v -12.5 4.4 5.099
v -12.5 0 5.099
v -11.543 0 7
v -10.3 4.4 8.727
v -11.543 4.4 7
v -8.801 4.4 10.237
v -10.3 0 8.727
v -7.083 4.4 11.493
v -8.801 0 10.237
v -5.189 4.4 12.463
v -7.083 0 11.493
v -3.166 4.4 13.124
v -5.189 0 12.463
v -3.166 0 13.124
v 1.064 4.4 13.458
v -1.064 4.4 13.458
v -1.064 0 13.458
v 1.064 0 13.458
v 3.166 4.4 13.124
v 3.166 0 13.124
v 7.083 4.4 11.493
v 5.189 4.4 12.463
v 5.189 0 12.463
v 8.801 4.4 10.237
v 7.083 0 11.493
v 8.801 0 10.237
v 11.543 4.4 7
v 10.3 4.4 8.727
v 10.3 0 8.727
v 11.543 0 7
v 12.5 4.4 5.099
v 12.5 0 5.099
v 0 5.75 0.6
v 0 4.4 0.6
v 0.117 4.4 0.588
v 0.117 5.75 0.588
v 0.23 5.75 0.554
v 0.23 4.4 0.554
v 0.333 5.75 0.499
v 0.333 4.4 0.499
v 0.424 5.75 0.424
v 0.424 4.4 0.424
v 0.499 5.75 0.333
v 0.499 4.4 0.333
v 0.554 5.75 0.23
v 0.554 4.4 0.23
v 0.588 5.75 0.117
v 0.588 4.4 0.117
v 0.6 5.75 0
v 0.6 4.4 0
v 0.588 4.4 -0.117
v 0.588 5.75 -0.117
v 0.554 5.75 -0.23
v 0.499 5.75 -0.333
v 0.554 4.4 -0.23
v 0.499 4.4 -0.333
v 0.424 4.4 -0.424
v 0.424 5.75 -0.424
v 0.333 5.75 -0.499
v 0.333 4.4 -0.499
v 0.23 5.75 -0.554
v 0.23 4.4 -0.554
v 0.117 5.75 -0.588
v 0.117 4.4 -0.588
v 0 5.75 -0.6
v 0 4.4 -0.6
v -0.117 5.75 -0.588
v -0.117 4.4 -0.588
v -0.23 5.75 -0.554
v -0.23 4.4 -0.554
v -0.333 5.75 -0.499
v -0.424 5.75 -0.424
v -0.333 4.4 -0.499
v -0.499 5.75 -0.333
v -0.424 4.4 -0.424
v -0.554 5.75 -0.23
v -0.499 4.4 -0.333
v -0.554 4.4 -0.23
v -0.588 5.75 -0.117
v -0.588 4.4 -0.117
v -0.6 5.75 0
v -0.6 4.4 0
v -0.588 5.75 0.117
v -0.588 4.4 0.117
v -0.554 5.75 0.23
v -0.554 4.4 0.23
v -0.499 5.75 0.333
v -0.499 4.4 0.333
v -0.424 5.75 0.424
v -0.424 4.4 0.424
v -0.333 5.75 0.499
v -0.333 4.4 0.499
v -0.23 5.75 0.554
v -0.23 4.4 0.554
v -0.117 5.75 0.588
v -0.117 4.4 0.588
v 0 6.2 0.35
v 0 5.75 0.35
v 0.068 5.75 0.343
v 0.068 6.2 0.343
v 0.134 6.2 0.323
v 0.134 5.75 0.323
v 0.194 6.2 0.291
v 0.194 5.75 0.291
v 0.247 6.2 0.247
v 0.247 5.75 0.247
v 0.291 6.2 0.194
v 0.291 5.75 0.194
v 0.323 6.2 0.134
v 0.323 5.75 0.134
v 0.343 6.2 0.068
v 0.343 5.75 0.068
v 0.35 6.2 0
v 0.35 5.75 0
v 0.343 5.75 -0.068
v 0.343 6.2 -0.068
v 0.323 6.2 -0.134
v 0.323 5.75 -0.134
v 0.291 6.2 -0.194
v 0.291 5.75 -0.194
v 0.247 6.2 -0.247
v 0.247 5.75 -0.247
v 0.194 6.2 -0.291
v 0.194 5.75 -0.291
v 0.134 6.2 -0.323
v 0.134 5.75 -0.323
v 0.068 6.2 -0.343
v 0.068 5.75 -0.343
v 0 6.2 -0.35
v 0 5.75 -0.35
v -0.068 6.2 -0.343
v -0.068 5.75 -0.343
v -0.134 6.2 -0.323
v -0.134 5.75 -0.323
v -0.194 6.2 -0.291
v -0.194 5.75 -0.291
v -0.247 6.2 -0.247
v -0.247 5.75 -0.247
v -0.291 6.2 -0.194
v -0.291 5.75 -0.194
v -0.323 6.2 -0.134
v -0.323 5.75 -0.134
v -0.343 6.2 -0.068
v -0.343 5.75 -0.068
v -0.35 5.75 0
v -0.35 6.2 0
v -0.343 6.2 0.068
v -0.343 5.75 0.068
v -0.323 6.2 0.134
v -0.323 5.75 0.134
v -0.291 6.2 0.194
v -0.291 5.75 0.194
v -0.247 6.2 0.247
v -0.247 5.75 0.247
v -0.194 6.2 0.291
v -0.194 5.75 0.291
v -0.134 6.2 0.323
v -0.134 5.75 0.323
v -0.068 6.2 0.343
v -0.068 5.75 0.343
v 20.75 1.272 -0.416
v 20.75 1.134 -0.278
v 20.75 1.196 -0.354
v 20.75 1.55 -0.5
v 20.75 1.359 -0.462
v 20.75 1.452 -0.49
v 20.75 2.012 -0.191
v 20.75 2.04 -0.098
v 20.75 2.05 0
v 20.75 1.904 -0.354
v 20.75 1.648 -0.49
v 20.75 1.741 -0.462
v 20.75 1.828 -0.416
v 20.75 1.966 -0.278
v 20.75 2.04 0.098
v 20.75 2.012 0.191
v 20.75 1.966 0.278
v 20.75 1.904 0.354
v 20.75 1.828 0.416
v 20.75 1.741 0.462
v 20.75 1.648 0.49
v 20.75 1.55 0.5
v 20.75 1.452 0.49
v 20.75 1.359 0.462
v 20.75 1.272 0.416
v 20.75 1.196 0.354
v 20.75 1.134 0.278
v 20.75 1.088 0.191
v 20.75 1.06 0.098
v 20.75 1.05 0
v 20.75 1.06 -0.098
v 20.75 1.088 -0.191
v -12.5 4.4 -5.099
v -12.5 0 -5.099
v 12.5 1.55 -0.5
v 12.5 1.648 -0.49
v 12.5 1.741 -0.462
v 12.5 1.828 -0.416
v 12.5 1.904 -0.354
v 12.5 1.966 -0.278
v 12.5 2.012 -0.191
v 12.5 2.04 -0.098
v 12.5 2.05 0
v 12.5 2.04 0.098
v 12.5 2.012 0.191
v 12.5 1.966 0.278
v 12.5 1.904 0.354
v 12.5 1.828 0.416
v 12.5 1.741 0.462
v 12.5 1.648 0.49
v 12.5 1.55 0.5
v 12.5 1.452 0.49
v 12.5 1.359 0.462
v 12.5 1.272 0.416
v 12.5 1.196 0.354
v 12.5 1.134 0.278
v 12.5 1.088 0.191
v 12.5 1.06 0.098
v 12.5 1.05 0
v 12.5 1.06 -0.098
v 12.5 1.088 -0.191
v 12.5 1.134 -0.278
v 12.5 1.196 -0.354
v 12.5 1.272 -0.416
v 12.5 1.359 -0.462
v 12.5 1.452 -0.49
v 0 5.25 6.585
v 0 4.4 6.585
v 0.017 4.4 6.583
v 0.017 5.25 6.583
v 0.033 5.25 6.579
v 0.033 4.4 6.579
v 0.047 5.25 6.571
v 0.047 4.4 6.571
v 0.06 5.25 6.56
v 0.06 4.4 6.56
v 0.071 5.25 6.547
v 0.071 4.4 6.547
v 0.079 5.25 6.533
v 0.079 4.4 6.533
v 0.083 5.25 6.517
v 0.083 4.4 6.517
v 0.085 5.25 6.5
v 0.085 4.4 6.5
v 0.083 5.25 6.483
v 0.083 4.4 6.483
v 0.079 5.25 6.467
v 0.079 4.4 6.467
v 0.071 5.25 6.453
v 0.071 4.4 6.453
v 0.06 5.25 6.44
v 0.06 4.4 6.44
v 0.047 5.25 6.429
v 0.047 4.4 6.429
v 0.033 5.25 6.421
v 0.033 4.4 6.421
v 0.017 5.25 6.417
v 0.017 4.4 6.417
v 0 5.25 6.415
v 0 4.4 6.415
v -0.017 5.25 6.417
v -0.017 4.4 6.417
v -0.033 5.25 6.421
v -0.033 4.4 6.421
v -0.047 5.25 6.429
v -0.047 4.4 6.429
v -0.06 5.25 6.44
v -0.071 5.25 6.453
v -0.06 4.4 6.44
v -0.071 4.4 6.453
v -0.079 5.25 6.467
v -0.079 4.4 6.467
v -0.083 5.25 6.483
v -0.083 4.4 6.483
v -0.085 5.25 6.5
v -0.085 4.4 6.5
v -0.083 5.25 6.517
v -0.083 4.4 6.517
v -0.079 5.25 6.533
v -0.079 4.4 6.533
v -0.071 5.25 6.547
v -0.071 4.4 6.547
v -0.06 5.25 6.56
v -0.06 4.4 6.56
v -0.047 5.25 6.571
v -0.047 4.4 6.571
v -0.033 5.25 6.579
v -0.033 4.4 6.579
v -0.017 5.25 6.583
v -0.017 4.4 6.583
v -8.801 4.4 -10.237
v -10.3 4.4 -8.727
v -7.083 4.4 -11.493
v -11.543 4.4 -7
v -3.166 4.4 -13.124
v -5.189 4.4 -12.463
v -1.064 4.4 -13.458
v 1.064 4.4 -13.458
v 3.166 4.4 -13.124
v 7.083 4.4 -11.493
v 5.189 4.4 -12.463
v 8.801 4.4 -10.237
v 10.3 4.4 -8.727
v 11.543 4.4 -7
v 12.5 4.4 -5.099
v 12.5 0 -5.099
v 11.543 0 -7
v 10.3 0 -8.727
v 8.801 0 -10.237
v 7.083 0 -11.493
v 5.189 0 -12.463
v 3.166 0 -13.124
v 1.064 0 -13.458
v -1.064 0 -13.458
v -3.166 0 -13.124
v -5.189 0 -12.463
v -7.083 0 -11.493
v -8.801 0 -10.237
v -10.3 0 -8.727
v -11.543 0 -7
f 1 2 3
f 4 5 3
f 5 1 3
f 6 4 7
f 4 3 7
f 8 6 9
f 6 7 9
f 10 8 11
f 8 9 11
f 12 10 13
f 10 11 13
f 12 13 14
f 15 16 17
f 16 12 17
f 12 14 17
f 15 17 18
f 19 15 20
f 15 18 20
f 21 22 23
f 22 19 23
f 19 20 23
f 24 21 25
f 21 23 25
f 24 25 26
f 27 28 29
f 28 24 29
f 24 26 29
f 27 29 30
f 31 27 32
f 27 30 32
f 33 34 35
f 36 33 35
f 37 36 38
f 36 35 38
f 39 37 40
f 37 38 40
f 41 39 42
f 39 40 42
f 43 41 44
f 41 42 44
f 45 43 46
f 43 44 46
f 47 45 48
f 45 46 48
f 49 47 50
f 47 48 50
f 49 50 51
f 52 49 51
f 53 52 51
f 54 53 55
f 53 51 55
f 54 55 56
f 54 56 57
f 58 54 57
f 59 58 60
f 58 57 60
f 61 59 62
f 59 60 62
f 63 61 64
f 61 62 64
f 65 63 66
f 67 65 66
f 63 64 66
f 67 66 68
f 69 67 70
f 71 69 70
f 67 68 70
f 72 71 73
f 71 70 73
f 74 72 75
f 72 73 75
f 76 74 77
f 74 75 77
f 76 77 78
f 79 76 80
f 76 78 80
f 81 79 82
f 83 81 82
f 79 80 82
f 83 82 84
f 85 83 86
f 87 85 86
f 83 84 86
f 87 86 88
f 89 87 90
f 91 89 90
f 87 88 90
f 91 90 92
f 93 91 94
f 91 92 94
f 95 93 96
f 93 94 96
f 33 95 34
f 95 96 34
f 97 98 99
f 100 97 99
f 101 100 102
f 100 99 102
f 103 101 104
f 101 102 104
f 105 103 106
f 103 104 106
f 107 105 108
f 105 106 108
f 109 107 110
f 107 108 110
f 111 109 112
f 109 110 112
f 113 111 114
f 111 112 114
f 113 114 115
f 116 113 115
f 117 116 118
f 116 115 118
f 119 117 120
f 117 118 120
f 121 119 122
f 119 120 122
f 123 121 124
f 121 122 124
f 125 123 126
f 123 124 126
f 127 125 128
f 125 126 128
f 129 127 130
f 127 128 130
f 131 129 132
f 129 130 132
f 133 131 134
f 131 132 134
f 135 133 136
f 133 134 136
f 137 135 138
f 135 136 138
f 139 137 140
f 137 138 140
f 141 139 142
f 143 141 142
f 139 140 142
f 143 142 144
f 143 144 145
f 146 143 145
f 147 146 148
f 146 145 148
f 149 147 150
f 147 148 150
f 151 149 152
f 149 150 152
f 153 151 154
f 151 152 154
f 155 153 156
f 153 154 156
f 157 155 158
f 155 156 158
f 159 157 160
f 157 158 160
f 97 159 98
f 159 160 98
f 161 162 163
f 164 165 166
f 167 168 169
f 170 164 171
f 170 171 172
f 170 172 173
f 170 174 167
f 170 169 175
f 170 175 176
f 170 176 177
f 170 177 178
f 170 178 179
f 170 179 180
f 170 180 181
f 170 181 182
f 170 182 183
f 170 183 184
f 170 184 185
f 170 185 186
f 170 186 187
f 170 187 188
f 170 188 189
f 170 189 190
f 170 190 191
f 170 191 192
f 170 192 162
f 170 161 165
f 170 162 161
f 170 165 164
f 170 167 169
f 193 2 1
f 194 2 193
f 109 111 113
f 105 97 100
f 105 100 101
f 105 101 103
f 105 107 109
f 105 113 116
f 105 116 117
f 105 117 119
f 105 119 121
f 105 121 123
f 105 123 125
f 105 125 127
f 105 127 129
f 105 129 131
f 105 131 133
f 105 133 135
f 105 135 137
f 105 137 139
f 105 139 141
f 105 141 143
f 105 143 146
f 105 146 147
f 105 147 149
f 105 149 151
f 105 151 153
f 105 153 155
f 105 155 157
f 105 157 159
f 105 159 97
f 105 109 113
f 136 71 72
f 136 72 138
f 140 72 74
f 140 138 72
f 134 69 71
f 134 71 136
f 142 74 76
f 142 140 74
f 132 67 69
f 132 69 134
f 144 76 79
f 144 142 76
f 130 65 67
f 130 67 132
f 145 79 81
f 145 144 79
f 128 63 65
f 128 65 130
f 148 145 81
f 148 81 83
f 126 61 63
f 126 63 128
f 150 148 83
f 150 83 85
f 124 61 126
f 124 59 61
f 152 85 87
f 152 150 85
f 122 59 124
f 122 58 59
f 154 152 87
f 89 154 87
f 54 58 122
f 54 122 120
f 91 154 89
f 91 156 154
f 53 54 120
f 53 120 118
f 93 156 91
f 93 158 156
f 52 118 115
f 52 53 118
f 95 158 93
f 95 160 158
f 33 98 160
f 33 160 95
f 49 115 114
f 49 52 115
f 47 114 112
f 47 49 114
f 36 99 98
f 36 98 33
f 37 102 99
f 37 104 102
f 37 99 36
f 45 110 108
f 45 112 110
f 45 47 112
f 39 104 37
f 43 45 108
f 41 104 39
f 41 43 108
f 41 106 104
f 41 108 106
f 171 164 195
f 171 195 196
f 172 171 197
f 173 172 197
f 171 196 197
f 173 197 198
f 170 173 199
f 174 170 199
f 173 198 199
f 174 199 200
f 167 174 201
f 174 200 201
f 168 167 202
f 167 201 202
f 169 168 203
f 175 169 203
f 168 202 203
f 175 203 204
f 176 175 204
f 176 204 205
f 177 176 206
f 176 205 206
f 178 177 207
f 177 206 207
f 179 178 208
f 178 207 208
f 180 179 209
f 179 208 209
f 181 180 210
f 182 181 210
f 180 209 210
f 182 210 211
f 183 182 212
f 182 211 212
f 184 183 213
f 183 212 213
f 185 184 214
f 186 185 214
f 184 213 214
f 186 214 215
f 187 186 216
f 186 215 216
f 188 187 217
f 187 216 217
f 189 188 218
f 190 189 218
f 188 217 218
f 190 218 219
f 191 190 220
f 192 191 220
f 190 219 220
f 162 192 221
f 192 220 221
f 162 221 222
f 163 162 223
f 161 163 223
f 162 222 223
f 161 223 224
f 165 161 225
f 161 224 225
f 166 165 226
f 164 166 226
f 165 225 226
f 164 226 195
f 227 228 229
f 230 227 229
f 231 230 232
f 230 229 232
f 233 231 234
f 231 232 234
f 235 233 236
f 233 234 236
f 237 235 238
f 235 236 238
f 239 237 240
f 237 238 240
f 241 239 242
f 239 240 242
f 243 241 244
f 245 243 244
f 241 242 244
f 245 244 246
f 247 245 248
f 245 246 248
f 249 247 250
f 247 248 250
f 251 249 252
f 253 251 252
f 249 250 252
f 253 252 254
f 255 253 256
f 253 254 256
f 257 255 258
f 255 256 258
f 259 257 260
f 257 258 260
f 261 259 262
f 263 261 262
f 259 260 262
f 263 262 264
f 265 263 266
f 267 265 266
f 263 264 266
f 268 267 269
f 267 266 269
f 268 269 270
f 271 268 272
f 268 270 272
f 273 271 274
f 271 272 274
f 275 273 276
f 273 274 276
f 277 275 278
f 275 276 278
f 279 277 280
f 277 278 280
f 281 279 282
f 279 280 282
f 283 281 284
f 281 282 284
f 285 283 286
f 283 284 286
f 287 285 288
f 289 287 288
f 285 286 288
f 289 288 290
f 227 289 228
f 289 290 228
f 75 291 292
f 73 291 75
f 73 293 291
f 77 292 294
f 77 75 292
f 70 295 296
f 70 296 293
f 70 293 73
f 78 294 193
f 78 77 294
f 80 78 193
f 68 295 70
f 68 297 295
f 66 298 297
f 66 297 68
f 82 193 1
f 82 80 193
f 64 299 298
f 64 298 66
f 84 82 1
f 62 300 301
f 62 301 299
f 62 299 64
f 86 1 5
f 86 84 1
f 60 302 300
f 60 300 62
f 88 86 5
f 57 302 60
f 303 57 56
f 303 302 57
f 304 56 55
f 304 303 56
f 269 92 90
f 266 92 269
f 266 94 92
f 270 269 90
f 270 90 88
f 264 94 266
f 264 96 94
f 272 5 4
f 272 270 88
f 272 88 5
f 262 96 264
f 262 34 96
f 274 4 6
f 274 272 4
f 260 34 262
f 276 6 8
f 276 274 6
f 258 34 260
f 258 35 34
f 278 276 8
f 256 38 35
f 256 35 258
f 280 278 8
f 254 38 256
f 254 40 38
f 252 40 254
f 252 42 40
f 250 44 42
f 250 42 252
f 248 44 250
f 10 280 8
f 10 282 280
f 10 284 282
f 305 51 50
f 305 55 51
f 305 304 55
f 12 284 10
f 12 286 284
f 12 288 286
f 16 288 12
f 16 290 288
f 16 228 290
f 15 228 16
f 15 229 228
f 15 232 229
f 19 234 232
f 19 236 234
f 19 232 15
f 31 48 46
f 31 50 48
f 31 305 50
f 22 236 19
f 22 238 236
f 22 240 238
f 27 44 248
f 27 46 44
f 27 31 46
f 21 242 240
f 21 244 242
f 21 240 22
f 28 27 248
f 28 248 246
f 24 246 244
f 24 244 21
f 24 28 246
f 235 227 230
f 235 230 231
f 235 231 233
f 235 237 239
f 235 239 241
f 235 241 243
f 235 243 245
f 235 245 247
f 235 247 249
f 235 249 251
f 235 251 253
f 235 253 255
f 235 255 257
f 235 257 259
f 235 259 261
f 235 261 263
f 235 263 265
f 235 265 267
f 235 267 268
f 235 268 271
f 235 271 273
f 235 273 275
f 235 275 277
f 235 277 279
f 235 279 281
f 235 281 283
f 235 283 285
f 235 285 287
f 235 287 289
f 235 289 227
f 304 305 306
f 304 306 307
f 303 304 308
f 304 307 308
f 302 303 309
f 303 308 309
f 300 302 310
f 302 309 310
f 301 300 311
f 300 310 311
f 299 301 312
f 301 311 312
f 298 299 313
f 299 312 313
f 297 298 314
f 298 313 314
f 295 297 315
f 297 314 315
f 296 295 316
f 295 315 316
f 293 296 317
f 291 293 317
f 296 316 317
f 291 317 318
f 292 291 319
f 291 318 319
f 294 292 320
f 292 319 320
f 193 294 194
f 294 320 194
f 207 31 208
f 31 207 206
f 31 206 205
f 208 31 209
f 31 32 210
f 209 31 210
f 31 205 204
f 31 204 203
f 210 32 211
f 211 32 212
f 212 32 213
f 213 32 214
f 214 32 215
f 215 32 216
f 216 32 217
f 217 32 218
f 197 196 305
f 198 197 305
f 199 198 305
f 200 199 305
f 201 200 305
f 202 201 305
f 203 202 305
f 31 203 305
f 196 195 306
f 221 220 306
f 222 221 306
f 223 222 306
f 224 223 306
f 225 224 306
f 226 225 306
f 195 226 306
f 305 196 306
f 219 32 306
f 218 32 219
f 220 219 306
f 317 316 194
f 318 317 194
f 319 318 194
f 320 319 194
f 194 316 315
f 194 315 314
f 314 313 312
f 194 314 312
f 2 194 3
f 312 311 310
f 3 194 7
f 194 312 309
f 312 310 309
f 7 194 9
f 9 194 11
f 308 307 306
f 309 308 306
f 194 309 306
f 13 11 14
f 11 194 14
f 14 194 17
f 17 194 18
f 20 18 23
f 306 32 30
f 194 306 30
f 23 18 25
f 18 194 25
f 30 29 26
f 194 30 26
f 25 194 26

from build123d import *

# Parameters (mm, degrees)
SKETCH1_R           = 13.5
BOSS_EXTRUDE1_DEPTH = 4.4
SKETCH2_W           = 11.68560188
SKETCH2_H           = 30
SKETCH2_W_2         = 6.209334753
CUT_EXTRUDE2_DEPTH  = 4.4
SKETCH3_R           = 0.6
BOSS_EXTRUDE2_DEPTH = 1.35
SKETCH4_R           = 0.35
BOSS_EXTRUDE3_DEPTH = 0.45
SKETCH5_R           = 0.5
BOSS_EXTRUDE4_DEPTH = 8.25
SKETCH7_R           = 0.085
BOSS_EXTRUDE5_DEPTH = 0.85


with BuildPart() as part:
    # Sketch1 → Boss-Extrude1 (new body)
    with BuildSketch(Plane(origin=(0, 0, 0), x_dir=(1, 0, 0), z_dir=(0, 1, 0))):
        with Locations(Location((0, 0, 0), (0, 0, 270))):
            Circle(SKETCH1_R)
    extrude(amount=BOSS_EXTRUDE1_DEPTH)

    # Sketch2 → Cut-Extrude2 (cut)
    with BuildSketch(Plane(origin=(0, 0, 0), x_dir=(1, 0, 0), z_dir=(0, 1, 0))):
        with Locations((-18.34280094, 0)):
            Rectangle(SKETCH2_W, SKETCH2_H)
        with Locations((15.604667377, 0)):
            Rectangle(SKETCH2_W_2, SKETCH2_H)
    extrude(amount=CUT_EXTRUDE2_DEPTH, mode=Mode.SUBTRACT)

    # Sketch3 → Boss-Extrude2 (add)
    with BuildSketch(Plane(origin=(0, 4.4, 0), x_dir=(1, 0, 0), z_dir=(0, 1, 0))):
        with Locations(Location((0, 0, 0), (0, 0, 270))):
            Circle(SKETCH3_R)
    extrude(amount=BOSS_EXTRUDE2_DEPTH)

    # Sketch4 → Boss-Extrude3 (add)
    with BuildSketch(Plane(origin=(0, 5.75, 0), x_dir=(1, 0, 0), z_dir=(0, 1, 0))):
        with Locations(Location((0, 0, 0), (0, 0, 270))):
            Circle(SKETCH4_R)
    extrude(amount=BOSS_EXTRUDE3_DEPTH)

    # Sketch5 → Boss-Extrude4 (add)
    with BuildSketch(Plane(origin=(12.5, 0, 0), x_dir=(0, 0, -1), z_dir=(1, 0, 0))):
        with Locations((0, 1.55)):
            Circle(SKETCH5_R)
    extrude(amount=BOSS_EXTRUDE4_DEPTH)

    # Sketch7 → Boss-Extrude5 (add)
    with BuildSketch(Plane(origin=(0, 4.4, 0), x_dir=(1, 0, 0), z_dir=(0, 1, 0))):
        with Locations(Location((0, -6.5, 0), (0, 0, 270))):
            Circle(SKETCH7_R)
    extrude(amount=BOSS_EXTRUDE5_DEPTH)


solid = part.part
